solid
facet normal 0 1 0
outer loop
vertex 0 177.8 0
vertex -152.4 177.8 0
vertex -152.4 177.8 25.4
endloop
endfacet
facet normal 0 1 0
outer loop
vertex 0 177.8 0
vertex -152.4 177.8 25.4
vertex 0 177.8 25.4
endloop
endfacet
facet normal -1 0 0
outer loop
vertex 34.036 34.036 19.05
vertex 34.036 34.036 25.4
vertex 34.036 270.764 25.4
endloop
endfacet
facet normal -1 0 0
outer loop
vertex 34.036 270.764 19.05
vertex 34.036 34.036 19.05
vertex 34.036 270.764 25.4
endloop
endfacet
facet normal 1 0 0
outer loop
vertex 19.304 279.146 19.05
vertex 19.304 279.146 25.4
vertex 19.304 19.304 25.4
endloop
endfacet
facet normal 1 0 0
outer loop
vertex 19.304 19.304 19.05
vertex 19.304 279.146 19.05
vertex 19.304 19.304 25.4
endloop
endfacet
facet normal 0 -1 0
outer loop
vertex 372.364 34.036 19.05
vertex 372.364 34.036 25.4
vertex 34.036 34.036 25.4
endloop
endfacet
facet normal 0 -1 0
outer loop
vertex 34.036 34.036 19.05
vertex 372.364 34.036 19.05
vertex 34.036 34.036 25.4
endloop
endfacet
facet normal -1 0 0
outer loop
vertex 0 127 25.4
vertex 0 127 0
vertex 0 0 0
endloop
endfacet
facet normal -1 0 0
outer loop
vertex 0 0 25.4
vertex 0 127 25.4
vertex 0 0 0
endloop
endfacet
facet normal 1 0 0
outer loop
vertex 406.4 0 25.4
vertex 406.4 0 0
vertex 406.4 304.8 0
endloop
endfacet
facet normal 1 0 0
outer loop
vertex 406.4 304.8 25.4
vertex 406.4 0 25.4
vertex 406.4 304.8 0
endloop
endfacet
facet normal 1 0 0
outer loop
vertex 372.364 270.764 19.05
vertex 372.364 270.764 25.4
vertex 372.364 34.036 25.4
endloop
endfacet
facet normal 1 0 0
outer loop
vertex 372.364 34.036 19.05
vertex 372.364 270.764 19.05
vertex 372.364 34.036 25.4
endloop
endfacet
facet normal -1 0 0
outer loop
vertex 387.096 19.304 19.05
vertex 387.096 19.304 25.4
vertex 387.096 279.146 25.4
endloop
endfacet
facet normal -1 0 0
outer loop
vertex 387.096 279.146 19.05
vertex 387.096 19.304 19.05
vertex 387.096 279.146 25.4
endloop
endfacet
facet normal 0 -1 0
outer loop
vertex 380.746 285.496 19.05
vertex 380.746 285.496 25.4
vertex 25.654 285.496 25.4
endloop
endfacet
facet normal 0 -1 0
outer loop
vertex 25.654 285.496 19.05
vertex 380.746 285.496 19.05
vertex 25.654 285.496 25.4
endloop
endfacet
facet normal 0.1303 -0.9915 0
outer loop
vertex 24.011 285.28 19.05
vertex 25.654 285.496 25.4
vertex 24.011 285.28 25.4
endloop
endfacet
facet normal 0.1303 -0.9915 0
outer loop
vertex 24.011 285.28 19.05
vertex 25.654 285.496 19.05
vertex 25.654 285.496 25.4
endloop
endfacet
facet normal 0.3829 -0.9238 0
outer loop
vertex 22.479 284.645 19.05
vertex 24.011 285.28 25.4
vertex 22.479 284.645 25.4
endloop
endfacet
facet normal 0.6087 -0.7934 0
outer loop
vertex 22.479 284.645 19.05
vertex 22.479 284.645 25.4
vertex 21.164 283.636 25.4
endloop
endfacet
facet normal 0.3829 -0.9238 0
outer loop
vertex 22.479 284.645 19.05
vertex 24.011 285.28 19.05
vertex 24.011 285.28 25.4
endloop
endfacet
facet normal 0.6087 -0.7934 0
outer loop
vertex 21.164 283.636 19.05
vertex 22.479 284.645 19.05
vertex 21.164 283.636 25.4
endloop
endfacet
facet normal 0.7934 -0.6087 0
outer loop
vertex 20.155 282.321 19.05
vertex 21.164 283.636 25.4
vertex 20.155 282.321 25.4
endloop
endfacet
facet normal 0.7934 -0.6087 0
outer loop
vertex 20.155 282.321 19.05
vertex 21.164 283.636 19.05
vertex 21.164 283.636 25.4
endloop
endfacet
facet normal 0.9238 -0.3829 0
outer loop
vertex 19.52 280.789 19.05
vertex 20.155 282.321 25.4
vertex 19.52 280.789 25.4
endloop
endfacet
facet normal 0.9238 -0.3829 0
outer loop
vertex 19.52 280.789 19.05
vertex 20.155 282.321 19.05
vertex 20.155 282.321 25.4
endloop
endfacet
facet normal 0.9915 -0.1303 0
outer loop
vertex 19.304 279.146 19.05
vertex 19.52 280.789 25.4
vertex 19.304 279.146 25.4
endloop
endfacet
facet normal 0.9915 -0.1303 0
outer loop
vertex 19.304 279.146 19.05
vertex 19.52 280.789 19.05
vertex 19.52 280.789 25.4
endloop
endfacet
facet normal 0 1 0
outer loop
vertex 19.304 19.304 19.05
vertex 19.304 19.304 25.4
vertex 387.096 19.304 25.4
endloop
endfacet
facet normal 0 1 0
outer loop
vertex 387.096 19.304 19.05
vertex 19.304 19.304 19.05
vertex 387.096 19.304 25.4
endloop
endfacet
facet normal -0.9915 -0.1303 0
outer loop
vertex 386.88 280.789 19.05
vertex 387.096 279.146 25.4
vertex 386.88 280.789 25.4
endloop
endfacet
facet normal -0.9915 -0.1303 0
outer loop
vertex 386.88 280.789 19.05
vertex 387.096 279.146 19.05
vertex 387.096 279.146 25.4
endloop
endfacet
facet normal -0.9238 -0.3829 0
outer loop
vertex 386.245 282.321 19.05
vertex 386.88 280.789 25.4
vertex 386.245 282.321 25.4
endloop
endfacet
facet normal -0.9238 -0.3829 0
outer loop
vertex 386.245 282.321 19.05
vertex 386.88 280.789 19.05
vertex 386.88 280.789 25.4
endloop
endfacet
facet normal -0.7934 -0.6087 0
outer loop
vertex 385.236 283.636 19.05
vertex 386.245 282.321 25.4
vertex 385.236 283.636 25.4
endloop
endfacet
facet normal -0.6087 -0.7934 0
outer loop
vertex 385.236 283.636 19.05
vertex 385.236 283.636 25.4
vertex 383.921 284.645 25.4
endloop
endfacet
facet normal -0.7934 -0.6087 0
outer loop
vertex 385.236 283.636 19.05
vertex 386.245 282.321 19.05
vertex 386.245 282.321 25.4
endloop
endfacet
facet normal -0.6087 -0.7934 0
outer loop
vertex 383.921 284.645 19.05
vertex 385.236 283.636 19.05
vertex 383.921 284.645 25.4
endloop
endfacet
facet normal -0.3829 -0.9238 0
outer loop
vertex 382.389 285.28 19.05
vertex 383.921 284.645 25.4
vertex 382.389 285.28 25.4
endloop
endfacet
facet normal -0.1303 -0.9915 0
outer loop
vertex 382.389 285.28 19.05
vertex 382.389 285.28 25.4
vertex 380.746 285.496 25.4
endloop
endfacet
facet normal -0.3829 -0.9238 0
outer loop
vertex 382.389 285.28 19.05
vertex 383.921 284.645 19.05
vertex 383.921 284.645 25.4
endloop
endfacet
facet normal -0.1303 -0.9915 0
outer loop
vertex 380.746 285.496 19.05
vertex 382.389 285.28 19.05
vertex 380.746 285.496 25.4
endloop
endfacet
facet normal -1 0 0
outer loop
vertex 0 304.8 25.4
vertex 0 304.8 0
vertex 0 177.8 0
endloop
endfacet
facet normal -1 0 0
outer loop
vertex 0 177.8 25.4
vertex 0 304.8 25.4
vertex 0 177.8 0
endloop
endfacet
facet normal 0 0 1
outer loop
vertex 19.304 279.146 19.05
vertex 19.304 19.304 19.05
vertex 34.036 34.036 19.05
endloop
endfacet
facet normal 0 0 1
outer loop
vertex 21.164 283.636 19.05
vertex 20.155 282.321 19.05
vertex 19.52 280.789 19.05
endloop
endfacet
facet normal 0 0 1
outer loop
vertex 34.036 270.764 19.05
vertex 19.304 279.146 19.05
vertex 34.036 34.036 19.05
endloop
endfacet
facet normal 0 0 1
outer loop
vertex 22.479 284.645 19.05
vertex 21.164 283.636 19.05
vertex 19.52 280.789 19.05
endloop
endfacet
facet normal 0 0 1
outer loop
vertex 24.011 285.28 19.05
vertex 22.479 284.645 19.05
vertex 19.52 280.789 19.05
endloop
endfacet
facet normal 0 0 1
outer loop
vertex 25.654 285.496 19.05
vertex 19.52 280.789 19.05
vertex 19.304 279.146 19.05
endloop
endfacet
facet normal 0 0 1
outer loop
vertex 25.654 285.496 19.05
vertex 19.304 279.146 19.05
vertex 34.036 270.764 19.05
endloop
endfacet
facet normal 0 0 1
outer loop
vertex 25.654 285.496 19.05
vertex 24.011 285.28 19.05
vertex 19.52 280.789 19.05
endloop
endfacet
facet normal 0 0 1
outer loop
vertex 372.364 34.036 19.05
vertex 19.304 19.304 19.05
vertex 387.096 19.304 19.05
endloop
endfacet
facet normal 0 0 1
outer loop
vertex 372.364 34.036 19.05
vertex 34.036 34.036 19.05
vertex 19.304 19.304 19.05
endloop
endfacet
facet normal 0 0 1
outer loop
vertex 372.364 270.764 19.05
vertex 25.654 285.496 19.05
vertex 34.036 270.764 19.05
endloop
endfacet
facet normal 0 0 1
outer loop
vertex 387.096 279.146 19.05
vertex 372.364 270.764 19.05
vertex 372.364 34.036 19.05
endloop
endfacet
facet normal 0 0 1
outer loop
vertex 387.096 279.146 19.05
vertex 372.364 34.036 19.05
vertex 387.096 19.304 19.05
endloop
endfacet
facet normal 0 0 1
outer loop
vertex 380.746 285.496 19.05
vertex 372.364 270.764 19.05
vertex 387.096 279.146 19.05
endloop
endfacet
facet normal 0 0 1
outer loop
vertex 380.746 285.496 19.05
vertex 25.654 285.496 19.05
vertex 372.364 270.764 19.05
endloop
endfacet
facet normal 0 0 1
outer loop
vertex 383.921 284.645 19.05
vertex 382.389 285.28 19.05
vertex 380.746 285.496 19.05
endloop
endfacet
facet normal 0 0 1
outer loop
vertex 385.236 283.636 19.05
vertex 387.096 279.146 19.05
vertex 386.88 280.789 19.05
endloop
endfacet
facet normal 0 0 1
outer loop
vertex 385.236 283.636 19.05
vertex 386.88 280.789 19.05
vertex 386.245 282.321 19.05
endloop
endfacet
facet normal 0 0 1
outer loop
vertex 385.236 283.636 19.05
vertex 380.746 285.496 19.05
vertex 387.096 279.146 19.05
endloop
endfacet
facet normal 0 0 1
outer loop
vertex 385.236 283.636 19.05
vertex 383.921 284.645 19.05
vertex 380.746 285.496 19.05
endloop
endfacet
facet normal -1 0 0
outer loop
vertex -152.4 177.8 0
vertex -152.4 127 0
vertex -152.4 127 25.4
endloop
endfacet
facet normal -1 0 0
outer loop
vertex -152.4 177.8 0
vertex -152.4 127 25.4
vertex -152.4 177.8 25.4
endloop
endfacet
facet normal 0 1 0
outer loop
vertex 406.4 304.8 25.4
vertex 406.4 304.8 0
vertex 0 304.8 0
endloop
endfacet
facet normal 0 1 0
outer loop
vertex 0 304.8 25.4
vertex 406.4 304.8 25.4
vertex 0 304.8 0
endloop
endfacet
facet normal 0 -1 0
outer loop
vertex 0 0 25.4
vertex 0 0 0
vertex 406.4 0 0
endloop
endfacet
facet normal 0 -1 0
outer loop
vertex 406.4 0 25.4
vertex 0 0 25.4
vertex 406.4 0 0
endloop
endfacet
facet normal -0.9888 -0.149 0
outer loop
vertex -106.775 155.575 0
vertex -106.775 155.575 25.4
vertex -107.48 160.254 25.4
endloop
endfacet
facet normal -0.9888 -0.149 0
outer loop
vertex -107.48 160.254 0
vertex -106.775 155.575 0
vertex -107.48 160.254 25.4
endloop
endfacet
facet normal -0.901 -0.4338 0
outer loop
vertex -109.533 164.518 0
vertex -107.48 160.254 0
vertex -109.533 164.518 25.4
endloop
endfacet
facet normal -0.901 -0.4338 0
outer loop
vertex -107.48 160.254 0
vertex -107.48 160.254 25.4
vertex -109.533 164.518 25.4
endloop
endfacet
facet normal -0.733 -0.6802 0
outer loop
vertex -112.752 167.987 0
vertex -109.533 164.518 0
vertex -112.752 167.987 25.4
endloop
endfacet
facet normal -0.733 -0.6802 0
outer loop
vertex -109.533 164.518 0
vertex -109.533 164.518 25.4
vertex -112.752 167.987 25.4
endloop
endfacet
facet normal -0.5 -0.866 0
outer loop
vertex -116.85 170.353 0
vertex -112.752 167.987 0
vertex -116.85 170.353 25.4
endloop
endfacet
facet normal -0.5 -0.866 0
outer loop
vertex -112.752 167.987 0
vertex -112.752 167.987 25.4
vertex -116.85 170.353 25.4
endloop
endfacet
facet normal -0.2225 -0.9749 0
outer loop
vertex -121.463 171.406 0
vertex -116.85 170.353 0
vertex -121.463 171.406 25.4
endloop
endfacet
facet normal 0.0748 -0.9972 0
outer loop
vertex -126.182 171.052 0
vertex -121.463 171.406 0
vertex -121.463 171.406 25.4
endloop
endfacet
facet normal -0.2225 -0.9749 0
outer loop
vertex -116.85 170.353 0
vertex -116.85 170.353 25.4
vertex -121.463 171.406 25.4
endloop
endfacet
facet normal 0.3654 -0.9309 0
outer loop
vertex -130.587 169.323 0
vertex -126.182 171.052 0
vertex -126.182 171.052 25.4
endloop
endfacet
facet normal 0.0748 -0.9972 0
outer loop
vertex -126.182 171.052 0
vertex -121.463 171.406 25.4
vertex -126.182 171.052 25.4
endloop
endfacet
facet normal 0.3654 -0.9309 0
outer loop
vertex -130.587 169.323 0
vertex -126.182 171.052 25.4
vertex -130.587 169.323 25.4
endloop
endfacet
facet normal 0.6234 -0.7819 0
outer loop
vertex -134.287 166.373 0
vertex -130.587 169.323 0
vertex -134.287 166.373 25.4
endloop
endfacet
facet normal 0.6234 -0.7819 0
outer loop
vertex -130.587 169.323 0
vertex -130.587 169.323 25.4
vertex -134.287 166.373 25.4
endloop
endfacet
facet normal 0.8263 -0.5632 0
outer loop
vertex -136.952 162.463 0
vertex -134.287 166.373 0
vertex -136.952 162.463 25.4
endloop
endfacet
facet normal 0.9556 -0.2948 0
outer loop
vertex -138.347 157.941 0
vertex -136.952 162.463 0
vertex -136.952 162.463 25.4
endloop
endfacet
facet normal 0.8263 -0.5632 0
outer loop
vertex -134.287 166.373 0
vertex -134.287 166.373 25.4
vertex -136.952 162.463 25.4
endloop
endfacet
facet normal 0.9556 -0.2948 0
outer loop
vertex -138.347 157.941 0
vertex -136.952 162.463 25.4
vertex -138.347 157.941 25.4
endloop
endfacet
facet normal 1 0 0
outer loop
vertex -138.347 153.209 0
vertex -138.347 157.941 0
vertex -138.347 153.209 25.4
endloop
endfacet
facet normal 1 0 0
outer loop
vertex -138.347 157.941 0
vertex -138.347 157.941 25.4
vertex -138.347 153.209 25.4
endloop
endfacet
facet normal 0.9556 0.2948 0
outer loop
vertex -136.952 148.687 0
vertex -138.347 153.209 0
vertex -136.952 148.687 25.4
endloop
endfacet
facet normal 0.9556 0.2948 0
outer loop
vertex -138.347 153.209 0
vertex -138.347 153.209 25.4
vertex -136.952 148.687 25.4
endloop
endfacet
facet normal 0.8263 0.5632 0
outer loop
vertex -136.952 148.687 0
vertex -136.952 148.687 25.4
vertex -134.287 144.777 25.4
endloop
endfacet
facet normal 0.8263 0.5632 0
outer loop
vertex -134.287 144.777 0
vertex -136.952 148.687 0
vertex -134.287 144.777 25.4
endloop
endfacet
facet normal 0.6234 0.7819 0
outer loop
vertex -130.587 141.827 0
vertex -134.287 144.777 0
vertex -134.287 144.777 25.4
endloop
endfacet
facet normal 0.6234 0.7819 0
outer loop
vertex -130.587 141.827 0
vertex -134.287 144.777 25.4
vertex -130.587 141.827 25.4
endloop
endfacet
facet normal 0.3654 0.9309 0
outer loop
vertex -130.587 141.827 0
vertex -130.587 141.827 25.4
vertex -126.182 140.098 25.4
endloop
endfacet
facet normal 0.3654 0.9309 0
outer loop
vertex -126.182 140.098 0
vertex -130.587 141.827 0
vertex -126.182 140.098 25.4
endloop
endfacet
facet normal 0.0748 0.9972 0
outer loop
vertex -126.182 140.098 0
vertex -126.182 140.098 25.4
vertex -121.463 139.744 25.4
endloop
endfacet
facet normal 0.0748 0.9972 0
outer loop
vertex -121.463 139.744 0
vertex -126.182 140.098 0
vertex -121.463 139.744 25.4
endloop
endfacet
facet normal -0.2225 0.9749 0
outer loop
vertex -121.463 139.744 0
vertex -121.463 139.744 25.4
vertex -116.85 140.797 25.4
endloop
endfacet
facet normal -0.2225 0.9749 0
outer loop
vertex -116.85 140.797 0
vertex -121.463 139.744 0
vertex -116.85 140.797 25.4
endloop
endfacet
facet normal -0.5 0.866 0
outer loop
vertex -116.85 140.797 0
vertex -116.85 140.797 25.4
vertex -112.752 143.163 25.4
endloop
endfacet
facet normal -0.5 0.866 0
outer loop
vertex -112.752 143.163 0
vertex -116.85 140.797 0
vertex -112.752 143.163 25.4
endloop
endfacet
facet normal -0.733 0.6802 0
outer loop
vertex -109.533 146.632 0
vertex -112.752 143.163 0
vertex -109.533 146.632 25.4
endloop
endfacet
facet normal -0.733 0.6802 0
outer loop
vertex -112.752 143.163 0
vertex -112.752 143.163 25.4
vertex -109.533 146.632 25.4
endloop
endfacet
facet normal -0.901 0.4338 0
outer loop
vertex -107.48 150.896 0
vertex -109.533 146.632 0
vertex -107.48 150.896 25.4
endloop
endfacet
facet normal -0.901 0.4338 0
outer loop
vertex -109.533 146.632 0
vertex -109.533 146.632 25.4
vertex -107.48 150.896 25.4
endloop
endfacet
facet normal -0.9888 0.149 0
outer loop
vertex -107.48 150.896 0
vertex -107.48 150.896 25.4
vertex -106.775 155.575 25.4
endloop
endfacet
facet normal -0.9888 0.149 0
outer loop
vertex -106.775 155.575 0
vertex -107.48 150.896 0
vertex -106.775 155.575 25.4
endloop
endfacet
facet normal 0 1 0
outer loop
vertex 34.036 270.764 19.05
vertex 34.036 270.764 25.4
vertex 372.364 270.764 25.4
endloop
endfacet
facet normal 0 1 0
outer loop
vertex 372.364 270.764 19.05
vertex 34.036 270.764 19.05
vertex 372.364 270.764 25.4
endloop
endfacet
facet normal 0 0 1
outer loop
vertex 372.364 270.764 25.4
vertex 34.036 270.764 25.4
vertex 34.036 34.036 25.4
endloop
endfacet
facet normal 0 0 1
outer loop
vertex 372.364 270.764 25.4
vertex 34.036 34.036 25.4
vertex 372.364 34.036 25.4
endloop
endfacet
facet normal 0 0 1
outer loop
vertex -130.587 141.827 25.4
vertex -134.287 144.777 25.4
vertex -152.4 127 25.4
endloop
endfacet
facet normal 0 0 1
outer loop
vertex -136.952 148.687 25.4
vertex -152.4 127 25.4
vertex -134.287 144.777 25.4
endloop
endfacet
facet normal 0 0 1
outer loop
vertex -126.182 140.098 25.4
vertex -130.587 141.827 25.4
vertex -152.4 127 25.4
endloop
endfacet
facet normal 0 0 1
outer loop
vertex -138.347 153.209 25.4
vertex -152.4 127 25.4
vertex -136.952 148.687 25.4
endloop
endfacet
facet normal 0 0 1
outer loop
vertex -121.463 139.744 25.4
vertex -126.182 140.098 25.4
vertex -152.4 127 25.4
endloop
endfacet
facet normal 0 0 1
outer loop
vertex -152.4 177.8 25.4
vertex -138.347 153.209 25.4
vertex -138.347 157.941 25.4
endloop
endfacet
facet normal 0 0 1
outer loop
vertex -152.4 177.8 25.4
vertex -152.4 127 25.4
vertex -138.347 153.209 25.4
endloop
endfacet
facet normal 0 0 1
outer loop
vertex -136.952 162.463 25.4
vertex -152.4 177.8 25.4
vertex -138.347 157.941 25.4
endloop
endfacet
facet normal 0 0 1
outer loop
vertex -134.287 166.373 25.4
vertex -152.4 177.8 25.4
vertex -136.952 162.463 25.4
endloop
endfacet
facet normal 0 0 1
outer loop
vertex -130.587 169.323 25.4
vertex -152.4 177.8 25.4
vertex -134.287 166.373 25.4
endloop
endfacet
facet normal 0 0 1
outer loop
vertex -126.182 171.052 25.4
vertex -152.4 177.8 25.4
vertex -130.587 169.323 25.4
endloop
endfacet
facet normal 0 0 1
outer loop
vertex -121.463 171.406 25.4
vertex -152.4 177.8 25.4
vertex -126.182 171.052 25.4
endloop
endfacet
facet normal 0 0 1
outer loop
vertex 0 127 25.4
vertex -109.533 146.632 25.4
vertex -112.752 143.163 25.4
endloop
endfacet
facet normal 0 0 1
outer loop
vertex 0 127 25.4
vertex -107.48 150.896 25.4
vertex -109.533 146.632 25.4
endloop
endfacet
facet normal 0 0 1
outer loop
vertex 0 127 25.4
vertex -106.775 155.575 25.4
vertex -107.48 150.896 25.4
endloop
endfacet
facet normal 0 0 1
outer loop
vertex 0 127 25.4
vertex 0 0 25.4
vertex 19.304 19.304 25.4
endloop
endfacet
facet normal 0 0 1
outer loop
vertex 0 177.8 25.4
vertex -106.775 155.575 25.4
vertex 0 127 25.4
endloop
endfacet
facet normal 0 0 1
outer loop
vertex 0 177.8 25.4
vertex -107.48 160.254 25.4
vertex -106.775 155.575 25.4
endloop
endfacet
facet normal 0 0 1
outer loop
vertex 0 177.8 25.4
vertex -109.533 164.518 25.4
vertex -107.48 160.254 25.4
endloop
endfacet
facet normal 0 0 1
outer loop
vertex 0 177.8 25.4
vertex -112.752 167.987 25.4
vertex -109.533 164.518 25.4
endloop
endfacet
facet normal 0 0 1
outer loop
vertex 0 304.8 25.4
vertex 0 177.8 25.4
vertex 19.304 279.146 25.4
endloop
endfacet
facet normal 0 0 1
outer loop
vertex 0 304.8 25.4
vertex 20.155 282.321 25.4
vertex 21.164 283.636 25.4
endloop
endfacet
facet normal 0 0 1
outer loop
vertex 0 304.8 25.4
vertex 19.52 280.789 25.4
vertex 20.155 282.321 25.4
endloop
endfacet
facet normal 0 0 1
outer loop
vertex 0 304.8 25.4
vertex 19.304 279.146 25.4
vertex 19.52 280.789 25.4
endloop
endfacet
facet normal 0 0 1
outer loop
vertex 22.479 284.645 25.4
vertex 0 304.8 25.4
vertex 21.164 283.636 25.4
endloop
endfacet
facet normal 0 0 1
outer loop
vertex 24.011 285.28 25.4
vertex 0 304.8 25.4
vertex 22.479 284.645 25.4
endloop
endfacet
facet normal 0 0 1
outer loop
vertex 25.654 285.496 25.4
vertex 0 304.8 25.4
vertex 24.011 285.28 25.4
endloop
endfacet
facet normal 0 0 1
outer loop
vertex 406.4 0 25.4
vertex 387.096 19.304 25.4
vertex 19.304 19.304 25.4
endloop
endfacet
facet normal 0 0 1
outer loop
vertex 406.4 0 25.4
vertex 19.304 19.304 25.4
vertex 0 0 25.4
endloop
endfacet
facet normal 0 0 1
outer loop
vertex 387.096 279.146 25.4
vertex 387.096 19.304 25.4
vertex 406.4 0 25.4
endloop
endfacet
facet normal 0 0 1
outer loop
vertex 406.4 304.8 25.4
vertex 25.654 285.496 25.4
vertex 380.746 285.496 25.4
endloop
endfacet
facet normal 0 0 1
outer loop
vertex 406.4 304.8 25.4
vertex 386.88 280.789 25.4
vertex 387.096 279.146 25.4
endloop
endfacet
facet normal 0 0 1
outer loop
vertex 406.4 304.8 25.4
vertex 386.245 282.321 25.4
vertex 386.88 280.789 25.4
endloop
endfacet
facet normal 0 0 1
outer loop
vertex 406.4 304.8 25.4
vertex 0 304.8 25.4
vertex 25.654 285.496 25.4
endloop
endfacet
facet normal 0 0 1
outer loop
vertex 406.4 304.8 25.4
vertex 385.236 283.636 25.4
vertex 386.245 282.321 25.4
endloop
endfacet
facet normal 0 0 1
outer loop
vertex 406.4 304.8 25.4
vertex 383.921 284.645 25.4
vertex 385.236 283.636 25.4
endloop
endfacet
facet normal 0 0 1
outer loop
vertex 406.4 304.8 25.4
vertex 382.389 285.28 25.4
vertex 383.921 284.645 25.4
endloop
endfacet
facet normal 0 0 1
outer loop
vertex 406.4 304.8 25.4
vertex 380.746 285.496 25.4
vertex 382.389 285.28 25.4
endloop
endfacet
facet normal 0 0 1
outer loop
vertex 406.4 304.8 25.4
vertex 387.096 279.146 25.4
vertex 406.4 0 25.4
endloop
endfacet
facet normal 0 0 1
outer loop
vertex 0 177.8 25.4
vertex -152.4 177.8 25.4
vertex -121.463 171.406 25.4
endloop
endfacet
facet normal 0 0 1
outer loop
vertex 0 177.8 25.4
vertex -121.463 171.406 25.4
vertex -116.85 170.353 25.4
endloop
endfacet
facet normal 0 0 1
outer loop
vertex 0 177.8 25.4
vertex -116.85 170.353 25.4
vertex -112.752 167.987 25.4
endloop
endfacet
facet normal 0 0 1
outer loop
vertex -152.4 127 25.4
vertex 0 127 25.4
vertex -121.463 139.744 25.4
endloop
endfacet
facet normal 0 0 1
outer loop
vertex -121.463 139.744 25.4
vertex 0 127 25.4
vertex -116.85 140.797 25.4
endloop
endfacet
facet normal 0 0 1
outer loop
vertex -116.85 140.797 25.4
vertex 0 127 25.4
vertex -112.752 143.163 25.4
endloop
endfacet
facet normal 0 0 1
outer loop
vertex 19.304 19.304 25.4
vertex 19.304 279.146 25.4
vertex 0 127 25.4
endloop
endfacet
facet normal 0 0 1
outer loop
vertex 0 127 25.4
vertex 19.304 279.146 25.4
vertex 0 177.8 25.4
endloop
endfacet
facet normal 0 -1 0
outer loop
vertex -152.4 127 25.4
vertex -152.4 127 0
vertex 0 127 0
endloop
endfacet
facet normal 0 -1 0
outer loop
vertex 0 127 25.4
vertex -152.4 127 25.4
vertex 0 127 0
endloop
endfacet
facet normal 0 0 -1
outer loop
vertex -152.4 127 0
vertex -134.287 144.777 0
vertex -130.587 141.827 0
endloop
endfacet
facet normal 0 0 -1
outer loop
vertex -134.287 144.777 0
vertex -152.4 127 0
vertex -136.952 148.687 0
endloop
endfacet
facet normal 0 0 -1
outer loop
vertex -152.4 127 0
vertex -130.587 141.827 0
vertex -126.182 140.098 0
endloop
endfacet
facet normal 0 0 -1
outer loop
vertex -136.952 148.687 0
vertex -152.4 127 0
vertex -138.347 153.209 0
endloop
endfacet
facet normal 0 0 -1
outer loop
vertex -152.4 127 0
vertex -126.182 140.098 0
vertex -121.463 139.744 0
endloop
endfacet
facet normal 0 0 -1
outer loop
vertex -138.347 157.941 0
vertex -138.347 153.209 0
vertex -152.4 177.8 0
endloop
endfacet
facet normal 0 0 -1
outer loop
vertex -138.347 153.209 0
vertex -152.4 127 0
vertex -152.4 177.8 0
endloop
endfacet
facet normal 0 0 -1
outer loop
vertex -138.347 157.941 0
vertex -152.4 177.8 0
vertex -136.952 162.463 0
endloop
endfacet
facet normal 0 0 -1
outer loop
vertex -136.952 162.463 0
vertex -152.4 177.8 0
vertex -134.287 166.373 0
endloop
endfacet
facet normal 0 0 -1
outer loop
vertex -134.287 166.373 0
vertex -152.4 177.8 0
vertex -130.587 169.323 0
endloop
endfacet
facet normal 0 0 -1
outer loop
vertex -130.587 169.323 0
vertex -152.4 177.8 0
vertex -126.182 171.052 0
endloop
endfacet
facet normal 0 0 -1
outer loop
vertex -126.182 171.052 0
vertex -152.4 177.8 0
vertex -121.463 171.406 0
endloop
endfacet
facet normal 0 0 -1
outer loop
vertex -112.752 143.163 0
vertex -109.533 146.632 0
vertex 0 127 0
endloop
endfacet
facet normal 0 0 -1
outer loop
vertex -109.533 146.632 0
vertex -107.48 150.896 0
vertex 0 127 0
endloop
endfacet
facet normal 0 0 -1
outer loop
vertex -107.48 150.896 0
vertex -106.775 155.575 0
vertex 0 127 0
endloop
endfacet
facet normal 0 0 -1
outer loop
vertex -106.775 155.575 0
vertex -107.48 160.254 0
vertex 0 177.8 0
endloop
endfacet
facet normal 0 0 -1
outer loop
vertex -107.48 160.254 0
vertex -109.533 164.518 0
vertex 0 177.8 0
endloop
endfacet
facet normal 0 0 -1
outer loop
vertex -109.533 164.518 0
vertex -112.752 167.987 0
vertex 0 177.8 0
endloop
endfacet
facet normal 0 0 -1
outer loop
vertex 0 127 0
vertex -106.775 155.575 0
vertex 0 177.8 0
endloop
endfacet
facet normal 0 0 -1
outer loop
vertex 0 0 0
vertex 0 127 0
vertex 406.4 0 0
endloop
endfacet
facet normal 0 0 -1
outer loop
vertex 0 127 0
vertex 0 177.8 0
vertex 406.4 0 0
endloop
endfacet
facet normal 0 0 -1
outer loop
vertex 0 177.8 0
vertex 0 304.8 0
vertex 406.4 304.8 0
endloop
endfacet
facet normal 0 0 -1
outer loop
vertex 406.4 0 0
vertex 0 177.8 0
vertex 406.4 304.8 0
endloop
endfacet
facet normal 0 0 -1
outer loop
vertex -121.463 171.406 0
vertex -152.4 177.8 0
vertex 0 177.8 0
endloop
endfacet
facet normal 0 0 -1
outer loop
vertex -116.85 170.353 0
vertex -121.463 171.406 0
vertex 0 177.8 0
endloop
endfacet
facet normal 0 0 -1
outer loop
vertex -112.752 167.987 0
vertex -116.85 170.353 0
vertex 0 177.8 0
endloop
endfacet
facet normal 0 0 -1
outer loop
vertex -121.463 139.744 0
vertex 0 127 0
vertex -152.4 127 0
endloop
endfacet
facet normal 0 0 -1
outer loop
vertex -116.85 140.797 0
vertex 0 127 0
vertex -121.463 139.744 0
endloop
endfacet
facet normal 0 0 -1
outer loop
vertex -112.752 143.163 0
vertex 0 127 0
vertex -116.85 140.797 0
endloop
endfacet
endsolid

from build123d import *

# Parameters (mm, degrees)
F0_W     = 152.4
F0_H     = 50.8
F1_DEPTH = 25.4
F2_R     = 15.875
F3_DEPTH = 25.4
F5_DEPTH = 6.35
F6_R     = 6.35


with BuildPart() as f1:
    # F0 (on Top) → F1 (new body)
    with BuildSketch(Plane.XY):
        Polygon((0, 127), (0, 0), (406.4, 0), (406.4, 304.8), (0, 304.8), (0, 177.8), align=None)
        with Locations((-76.2, 152.4)):
            Rectangle(F0_W, F0_H)
    extrude(amount=F1_DEPTH)

    # F2 (on face) → F3 (cut)
    with BuildSketch(Plane.XY.offset(25.4)):
        with Locations((-122.649528, 155.575)):
            Circle(F2_R)
    extrude(amount=-F3_DEPTH, mode=Mode.SUBTRACT)

    # F4 (on face) → F5 (cut)
    with BuildSketch(Plane.XY.offset(25.4)):
        Polygon((19.304004, 127), (19.304004, 19.304004), (387.095996, 19.304004), (387.095996, 285.495996), (19.304004, 285.495996), (19.304004, 177.8), align=None)
        Polygon((34.036007, 127), (34.036007, 177.8), (34.036007, 270.763993), (372.363993, 270.763993), (372.363993, 34.036007), (34.036007, 34.036007), align=None, mode=Mode.SUBTRACT)
    extrude(amount=-F5_DEPTH, mode=Mode.SUBTRACT)

    # F6
    f6_edges = [f1.edges().sort_by_distance(p)[0] for p in [
        (19.304004, 285.495996, 22.225),
        (387.095996, 285.495996, 22.225),
    ]]
    fillet(f6_edges, radius=F6_R)


solid = f1.part
